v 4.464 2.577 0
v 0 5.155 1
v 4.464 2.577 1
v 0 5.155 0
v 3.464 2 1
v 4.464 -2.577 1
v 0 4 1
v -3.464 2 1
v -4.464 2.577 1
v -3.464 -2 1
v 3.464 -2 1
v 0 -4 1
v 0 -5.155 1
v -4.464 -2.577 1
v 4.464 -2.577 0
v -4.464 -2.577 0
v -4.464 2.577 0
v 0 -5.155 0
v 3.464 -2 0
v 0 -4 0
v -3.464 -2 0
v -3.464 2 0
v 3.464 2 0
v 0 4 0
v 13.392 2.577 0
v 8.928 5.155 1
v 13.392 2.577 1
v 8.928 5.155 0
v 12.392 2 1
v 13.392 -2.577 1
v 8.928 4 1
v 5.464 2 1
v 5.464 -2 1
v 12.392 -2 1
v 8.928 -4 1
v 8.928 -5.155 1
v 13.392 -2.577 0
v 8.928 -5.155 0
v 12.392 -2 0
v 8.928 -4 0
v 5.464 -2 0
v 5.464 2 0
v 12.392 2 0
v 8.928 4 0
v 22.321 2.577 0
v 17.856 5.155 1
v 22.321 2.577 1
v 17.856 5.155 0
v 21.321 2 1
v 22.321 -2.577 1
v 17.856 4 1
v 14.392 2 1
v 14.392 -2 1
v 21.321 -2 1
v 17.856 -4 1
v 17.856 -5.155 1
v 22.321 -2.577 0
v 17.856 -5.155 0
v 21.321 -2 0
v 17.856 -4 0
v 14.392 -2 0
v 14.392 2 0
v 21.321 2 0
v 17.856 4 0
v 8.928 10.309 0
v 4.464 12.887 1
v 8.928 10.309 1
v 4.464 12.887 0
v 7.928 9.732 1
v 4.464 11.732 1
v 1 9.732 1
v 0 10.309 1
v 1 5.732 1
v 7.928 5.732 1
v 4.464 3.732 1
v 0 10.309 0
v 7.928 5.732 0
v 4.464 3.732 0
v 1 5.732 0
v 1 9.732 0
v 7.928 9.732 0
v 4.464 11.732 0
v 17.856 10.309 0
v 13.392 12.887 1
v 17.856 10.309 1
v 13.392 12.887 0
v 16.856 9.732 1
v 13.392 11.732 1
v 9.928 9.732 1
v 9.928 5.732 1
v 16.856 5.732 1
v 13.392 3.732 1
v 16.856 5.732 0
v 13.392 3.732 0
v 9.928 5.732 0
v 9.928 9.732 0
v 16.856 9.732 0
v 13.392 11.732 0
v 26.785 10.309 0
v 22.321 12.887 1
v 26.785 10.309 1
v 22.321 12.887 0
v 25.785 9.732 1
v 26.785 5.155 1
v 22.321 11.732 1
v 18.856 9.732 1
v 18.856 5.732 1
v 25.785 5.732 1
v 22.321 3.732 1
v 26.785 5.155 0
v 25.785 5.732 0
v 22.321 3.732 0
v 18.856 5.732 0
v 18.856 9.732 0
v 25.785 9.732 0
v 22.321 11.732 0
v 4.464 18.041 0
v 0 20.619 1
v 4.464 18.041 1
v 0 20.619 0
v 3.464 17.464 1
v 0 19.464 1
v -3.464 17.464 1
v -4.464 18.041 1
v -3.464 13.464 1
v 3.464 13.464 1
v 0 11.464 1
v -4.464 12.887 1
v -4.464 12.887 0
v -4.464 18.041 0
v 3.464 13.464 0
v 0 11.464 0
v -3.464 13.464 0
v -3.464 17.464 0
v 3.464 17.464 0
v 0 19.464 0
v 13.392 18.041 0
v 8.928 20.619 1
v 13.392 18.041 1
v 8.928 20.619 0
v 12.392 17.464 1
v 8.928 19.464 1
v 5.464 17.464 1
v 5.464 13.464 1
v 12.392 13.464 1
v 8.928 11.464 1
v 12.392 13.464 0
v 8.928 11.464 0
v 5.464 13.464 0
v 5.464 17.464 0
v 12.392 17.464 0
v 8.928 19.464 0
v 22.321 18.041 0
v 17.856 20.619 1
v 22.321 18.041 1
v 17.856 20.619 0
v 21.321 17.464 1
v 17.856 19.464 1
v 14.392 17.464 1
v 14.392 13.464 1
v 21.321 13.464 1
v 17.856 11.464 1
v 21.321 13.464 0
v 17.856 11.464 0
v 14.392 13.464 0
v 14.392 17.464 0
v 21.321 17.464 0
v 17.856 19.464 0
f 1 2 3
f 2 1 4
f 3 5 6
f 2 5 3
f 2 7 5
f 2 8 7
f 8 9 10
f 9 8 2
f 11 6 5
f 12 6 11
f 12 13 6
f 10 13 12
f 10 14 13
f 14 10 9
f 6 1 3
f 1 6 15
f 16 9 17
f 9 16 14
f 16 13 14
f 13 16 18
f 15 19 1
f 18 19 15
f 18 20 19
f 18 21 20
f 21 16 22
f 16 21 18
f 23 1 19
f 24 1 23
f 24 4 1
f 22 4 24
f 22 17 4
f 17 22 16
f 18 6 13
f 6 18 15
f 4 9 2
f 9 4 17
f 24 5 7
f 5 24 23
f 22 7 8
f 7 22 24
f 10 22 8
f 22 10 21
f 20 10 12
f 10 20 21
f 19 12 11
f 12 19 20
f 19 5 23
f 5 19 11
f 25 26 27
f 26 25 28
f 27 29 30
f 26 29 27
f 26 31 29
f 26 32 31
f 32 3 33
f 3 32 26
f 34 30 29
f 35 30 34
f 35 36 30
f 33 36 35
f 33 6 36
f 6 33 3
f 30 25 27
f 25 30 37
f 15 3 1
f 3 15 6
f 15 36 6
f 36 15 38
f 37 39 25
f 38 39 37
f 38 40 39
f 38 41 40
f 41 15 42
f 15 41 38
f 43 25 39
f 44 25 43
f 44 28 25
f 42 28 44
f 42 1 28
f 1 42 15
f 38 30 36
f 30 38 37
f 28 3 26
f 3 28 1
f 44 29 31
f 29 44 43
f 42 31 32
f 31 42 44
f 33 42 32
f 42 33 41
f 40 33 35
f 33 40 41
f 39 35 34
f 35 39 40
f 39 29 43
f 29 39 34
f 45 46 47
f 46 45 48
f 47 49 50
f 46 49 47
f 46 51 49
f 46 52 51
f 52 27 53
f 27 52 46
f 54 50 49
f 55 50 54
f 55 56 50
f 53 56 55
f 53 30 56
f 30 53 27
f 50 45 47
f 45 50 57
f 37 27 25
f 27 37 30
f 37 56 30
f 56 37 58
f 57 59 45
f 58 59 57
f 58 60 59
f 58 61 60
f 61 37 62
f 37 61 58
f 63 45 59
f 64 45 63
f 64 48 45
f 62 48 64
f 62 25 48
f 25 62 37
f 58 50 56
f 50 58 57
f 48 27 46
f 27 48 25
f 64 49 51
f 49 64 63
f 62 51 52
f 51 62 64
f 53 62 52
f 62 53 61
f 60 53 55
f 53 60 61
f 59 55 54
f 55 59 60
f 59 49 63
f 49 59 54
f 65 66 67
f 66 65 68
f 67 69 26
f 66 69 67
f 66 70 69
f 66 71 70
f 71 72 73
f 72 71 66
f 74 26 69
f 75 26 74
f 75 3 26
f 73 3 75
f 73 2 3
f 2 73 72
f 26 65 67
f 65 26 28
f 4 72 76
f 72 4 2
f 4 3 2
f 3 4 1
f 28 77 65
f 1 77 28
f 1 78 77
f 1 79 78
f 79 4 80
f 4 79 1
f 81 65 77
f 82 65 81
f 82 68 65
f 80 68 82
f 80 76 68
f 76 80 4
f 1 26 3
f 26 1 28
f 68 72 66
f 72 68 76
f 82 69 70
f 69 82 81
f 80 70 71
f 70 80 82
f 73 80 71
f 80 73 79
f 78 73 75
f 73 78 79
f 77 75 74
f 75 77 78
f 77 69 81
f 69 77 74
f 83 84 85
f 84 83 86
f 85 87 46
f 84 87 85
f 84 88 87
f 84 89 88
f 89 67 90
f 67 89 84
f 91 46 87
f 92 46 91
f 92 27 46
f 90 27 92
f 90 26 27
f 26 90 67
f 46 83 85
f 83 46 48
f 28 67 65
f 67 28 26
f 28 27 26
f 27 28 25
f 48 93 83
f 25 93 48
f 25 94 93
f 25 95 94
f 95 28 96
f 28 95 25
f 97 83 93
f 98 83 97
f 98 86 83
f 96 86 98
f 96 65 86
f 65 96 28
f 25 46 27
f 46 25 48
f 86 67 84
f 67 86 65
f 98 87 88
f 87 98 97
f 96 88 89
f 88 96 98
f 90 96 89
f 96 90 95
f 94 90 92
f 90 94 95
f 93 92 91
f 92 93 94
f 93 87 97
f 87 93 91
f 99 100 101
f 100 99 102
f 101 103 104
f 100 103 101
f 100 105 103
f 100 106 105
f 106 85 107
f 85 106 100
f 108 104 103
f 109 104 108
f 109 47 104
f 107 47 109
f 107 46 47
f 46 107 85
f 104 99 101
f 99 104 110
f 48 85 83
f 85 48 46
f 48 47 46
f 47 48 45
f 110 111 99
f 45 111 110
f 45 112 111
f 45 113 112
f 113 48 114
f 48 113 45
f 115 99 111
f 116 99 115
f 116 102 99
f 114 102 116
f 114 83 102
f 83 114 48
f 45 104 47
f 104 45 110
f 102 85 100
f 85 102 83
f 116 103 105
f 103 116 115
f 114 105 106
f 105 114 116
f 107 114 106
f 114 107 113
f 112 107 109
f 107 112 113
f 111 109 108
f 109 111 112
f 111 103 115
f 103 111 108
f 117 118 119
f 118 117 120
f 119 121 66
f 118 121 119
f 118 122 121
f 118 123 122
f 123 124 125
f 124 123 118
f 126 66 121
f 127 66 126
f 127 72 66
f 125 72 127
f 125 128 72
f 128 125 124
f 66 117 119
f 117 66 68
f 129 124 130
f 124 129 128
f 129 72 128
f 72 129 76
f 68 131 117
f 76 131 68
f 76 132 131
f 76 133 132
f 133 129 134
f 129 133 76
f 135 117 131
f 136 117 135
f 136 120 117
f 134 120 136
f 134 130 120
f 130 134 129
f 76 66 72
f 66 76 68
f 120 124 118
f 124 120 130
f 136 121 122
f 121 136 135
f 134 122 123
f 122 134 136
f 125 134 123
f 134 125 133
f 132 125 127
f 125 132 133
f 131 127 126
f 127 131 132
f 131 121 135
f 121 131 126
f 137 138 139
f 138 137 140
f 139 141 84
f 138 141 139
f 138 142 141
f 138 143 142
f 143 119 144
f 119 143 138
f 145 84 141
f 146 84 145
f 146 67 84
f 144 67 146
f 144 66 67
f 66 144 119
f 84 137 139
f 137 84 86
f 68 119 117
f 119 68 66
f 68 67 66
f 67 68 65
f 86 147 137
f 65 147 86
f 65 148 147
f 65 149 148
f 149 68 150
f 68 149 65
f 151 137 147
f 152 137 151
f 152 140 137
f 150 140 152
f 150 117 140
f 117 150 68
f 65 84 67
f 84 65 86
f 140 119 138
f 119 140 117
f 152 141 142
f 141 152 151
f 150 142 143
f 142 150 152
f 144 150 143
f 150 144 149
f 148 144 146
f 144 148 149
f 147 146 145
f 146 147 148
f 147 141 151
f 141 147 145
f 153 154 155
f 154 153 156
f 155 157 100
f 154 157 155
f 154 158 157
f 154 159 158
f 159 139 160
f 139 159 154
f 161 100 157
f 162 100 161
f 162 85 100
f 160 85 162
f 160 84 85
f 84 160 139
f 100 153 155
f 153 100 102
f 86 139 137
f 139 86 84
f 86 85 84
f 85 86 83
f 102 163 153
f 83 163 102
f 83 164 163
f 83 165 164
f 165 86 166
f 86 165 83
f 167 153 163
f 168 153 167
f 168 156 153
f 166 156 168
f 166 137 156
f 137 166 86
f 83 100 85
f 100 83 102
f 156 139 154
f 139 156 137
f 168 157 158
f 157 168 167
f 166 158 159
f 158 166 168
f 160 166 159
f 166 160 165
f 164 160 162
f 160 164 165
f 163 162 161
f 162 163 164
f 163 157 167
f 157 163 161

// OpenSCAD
radius = 4;
inscribedOrCircumscribed = 0;//	[0:Use inscribed (corner to corner) radius, 1:Use circumscribed (edge to edge) radius]
//(inscribed radius)*cos(30)=circumscribed radius
combRadius = radius*cos(30)*(1-inscribedOrCircumscribed)+radius*inscribedOrCircumscribed;
combWidth = 2*combRadius;
//distance between edges of honeycomb holes
combSeperation = 2;
//Thickness/extrusion in the z direction
thickness = 1;
//Extends the wall thickness for a thicker outside edge. Might cause slow build times for large arrays.
overlap = 0; //[0:Don't use overlapping shapes, 1:Use overlapping shapes]
//Number of holes in the X direction
X_Count = 3;
//Number of holes in the Y direction
Y_Count = 3;
l=1/cos(30);
y=l*sin(30);
//radius*cos(30) = combWidth/2
//radius=(combWidth/2)/cos(3);


//hexagon(h=thickness,w=combWidth);
honeycomb(X_Count,Y_Count);
//hollowHexagon(thickness,combWidth,combSeperation/2);


module hexagon(h=1,w=1){
    //l*cos(30)=1,  
    
    hexPoints=[[1,y],[0,l],[-1,y],[-1,-y],[0,-l],[1,-y]];
    linear_extrude(h){
        polygon((w/2)*hexPoints);
    }   
}
module hollowHexagon(h=1,cW=10,wallWidth=1){
    difference(){
        hexagon(h,cW+wallWidth*2+overlap*wallWidth*2);
        
        translate([0,0,-1]){
            hexagon(h+2,cW);
        }
        
    }
    
}

module honeycomb(xCount, yCount){
    yShift=sin(60)*(combWidth+combSeperation);
    for (j =[0:yCount-1]){
        translate([0,yShift*j,0]){
            for (i = [0:xCount-1]) {
               translate([(combWidth*.5+combSeperation*.5)*(j%2),0,0]){
               translate([i*(combWidth+combSeperation),0,0]){
                  hollowHexagon(thickness,combWidth,combSeperation/2);
               } 
               }
            
            }
        }
    
    }
    
    
    
}
